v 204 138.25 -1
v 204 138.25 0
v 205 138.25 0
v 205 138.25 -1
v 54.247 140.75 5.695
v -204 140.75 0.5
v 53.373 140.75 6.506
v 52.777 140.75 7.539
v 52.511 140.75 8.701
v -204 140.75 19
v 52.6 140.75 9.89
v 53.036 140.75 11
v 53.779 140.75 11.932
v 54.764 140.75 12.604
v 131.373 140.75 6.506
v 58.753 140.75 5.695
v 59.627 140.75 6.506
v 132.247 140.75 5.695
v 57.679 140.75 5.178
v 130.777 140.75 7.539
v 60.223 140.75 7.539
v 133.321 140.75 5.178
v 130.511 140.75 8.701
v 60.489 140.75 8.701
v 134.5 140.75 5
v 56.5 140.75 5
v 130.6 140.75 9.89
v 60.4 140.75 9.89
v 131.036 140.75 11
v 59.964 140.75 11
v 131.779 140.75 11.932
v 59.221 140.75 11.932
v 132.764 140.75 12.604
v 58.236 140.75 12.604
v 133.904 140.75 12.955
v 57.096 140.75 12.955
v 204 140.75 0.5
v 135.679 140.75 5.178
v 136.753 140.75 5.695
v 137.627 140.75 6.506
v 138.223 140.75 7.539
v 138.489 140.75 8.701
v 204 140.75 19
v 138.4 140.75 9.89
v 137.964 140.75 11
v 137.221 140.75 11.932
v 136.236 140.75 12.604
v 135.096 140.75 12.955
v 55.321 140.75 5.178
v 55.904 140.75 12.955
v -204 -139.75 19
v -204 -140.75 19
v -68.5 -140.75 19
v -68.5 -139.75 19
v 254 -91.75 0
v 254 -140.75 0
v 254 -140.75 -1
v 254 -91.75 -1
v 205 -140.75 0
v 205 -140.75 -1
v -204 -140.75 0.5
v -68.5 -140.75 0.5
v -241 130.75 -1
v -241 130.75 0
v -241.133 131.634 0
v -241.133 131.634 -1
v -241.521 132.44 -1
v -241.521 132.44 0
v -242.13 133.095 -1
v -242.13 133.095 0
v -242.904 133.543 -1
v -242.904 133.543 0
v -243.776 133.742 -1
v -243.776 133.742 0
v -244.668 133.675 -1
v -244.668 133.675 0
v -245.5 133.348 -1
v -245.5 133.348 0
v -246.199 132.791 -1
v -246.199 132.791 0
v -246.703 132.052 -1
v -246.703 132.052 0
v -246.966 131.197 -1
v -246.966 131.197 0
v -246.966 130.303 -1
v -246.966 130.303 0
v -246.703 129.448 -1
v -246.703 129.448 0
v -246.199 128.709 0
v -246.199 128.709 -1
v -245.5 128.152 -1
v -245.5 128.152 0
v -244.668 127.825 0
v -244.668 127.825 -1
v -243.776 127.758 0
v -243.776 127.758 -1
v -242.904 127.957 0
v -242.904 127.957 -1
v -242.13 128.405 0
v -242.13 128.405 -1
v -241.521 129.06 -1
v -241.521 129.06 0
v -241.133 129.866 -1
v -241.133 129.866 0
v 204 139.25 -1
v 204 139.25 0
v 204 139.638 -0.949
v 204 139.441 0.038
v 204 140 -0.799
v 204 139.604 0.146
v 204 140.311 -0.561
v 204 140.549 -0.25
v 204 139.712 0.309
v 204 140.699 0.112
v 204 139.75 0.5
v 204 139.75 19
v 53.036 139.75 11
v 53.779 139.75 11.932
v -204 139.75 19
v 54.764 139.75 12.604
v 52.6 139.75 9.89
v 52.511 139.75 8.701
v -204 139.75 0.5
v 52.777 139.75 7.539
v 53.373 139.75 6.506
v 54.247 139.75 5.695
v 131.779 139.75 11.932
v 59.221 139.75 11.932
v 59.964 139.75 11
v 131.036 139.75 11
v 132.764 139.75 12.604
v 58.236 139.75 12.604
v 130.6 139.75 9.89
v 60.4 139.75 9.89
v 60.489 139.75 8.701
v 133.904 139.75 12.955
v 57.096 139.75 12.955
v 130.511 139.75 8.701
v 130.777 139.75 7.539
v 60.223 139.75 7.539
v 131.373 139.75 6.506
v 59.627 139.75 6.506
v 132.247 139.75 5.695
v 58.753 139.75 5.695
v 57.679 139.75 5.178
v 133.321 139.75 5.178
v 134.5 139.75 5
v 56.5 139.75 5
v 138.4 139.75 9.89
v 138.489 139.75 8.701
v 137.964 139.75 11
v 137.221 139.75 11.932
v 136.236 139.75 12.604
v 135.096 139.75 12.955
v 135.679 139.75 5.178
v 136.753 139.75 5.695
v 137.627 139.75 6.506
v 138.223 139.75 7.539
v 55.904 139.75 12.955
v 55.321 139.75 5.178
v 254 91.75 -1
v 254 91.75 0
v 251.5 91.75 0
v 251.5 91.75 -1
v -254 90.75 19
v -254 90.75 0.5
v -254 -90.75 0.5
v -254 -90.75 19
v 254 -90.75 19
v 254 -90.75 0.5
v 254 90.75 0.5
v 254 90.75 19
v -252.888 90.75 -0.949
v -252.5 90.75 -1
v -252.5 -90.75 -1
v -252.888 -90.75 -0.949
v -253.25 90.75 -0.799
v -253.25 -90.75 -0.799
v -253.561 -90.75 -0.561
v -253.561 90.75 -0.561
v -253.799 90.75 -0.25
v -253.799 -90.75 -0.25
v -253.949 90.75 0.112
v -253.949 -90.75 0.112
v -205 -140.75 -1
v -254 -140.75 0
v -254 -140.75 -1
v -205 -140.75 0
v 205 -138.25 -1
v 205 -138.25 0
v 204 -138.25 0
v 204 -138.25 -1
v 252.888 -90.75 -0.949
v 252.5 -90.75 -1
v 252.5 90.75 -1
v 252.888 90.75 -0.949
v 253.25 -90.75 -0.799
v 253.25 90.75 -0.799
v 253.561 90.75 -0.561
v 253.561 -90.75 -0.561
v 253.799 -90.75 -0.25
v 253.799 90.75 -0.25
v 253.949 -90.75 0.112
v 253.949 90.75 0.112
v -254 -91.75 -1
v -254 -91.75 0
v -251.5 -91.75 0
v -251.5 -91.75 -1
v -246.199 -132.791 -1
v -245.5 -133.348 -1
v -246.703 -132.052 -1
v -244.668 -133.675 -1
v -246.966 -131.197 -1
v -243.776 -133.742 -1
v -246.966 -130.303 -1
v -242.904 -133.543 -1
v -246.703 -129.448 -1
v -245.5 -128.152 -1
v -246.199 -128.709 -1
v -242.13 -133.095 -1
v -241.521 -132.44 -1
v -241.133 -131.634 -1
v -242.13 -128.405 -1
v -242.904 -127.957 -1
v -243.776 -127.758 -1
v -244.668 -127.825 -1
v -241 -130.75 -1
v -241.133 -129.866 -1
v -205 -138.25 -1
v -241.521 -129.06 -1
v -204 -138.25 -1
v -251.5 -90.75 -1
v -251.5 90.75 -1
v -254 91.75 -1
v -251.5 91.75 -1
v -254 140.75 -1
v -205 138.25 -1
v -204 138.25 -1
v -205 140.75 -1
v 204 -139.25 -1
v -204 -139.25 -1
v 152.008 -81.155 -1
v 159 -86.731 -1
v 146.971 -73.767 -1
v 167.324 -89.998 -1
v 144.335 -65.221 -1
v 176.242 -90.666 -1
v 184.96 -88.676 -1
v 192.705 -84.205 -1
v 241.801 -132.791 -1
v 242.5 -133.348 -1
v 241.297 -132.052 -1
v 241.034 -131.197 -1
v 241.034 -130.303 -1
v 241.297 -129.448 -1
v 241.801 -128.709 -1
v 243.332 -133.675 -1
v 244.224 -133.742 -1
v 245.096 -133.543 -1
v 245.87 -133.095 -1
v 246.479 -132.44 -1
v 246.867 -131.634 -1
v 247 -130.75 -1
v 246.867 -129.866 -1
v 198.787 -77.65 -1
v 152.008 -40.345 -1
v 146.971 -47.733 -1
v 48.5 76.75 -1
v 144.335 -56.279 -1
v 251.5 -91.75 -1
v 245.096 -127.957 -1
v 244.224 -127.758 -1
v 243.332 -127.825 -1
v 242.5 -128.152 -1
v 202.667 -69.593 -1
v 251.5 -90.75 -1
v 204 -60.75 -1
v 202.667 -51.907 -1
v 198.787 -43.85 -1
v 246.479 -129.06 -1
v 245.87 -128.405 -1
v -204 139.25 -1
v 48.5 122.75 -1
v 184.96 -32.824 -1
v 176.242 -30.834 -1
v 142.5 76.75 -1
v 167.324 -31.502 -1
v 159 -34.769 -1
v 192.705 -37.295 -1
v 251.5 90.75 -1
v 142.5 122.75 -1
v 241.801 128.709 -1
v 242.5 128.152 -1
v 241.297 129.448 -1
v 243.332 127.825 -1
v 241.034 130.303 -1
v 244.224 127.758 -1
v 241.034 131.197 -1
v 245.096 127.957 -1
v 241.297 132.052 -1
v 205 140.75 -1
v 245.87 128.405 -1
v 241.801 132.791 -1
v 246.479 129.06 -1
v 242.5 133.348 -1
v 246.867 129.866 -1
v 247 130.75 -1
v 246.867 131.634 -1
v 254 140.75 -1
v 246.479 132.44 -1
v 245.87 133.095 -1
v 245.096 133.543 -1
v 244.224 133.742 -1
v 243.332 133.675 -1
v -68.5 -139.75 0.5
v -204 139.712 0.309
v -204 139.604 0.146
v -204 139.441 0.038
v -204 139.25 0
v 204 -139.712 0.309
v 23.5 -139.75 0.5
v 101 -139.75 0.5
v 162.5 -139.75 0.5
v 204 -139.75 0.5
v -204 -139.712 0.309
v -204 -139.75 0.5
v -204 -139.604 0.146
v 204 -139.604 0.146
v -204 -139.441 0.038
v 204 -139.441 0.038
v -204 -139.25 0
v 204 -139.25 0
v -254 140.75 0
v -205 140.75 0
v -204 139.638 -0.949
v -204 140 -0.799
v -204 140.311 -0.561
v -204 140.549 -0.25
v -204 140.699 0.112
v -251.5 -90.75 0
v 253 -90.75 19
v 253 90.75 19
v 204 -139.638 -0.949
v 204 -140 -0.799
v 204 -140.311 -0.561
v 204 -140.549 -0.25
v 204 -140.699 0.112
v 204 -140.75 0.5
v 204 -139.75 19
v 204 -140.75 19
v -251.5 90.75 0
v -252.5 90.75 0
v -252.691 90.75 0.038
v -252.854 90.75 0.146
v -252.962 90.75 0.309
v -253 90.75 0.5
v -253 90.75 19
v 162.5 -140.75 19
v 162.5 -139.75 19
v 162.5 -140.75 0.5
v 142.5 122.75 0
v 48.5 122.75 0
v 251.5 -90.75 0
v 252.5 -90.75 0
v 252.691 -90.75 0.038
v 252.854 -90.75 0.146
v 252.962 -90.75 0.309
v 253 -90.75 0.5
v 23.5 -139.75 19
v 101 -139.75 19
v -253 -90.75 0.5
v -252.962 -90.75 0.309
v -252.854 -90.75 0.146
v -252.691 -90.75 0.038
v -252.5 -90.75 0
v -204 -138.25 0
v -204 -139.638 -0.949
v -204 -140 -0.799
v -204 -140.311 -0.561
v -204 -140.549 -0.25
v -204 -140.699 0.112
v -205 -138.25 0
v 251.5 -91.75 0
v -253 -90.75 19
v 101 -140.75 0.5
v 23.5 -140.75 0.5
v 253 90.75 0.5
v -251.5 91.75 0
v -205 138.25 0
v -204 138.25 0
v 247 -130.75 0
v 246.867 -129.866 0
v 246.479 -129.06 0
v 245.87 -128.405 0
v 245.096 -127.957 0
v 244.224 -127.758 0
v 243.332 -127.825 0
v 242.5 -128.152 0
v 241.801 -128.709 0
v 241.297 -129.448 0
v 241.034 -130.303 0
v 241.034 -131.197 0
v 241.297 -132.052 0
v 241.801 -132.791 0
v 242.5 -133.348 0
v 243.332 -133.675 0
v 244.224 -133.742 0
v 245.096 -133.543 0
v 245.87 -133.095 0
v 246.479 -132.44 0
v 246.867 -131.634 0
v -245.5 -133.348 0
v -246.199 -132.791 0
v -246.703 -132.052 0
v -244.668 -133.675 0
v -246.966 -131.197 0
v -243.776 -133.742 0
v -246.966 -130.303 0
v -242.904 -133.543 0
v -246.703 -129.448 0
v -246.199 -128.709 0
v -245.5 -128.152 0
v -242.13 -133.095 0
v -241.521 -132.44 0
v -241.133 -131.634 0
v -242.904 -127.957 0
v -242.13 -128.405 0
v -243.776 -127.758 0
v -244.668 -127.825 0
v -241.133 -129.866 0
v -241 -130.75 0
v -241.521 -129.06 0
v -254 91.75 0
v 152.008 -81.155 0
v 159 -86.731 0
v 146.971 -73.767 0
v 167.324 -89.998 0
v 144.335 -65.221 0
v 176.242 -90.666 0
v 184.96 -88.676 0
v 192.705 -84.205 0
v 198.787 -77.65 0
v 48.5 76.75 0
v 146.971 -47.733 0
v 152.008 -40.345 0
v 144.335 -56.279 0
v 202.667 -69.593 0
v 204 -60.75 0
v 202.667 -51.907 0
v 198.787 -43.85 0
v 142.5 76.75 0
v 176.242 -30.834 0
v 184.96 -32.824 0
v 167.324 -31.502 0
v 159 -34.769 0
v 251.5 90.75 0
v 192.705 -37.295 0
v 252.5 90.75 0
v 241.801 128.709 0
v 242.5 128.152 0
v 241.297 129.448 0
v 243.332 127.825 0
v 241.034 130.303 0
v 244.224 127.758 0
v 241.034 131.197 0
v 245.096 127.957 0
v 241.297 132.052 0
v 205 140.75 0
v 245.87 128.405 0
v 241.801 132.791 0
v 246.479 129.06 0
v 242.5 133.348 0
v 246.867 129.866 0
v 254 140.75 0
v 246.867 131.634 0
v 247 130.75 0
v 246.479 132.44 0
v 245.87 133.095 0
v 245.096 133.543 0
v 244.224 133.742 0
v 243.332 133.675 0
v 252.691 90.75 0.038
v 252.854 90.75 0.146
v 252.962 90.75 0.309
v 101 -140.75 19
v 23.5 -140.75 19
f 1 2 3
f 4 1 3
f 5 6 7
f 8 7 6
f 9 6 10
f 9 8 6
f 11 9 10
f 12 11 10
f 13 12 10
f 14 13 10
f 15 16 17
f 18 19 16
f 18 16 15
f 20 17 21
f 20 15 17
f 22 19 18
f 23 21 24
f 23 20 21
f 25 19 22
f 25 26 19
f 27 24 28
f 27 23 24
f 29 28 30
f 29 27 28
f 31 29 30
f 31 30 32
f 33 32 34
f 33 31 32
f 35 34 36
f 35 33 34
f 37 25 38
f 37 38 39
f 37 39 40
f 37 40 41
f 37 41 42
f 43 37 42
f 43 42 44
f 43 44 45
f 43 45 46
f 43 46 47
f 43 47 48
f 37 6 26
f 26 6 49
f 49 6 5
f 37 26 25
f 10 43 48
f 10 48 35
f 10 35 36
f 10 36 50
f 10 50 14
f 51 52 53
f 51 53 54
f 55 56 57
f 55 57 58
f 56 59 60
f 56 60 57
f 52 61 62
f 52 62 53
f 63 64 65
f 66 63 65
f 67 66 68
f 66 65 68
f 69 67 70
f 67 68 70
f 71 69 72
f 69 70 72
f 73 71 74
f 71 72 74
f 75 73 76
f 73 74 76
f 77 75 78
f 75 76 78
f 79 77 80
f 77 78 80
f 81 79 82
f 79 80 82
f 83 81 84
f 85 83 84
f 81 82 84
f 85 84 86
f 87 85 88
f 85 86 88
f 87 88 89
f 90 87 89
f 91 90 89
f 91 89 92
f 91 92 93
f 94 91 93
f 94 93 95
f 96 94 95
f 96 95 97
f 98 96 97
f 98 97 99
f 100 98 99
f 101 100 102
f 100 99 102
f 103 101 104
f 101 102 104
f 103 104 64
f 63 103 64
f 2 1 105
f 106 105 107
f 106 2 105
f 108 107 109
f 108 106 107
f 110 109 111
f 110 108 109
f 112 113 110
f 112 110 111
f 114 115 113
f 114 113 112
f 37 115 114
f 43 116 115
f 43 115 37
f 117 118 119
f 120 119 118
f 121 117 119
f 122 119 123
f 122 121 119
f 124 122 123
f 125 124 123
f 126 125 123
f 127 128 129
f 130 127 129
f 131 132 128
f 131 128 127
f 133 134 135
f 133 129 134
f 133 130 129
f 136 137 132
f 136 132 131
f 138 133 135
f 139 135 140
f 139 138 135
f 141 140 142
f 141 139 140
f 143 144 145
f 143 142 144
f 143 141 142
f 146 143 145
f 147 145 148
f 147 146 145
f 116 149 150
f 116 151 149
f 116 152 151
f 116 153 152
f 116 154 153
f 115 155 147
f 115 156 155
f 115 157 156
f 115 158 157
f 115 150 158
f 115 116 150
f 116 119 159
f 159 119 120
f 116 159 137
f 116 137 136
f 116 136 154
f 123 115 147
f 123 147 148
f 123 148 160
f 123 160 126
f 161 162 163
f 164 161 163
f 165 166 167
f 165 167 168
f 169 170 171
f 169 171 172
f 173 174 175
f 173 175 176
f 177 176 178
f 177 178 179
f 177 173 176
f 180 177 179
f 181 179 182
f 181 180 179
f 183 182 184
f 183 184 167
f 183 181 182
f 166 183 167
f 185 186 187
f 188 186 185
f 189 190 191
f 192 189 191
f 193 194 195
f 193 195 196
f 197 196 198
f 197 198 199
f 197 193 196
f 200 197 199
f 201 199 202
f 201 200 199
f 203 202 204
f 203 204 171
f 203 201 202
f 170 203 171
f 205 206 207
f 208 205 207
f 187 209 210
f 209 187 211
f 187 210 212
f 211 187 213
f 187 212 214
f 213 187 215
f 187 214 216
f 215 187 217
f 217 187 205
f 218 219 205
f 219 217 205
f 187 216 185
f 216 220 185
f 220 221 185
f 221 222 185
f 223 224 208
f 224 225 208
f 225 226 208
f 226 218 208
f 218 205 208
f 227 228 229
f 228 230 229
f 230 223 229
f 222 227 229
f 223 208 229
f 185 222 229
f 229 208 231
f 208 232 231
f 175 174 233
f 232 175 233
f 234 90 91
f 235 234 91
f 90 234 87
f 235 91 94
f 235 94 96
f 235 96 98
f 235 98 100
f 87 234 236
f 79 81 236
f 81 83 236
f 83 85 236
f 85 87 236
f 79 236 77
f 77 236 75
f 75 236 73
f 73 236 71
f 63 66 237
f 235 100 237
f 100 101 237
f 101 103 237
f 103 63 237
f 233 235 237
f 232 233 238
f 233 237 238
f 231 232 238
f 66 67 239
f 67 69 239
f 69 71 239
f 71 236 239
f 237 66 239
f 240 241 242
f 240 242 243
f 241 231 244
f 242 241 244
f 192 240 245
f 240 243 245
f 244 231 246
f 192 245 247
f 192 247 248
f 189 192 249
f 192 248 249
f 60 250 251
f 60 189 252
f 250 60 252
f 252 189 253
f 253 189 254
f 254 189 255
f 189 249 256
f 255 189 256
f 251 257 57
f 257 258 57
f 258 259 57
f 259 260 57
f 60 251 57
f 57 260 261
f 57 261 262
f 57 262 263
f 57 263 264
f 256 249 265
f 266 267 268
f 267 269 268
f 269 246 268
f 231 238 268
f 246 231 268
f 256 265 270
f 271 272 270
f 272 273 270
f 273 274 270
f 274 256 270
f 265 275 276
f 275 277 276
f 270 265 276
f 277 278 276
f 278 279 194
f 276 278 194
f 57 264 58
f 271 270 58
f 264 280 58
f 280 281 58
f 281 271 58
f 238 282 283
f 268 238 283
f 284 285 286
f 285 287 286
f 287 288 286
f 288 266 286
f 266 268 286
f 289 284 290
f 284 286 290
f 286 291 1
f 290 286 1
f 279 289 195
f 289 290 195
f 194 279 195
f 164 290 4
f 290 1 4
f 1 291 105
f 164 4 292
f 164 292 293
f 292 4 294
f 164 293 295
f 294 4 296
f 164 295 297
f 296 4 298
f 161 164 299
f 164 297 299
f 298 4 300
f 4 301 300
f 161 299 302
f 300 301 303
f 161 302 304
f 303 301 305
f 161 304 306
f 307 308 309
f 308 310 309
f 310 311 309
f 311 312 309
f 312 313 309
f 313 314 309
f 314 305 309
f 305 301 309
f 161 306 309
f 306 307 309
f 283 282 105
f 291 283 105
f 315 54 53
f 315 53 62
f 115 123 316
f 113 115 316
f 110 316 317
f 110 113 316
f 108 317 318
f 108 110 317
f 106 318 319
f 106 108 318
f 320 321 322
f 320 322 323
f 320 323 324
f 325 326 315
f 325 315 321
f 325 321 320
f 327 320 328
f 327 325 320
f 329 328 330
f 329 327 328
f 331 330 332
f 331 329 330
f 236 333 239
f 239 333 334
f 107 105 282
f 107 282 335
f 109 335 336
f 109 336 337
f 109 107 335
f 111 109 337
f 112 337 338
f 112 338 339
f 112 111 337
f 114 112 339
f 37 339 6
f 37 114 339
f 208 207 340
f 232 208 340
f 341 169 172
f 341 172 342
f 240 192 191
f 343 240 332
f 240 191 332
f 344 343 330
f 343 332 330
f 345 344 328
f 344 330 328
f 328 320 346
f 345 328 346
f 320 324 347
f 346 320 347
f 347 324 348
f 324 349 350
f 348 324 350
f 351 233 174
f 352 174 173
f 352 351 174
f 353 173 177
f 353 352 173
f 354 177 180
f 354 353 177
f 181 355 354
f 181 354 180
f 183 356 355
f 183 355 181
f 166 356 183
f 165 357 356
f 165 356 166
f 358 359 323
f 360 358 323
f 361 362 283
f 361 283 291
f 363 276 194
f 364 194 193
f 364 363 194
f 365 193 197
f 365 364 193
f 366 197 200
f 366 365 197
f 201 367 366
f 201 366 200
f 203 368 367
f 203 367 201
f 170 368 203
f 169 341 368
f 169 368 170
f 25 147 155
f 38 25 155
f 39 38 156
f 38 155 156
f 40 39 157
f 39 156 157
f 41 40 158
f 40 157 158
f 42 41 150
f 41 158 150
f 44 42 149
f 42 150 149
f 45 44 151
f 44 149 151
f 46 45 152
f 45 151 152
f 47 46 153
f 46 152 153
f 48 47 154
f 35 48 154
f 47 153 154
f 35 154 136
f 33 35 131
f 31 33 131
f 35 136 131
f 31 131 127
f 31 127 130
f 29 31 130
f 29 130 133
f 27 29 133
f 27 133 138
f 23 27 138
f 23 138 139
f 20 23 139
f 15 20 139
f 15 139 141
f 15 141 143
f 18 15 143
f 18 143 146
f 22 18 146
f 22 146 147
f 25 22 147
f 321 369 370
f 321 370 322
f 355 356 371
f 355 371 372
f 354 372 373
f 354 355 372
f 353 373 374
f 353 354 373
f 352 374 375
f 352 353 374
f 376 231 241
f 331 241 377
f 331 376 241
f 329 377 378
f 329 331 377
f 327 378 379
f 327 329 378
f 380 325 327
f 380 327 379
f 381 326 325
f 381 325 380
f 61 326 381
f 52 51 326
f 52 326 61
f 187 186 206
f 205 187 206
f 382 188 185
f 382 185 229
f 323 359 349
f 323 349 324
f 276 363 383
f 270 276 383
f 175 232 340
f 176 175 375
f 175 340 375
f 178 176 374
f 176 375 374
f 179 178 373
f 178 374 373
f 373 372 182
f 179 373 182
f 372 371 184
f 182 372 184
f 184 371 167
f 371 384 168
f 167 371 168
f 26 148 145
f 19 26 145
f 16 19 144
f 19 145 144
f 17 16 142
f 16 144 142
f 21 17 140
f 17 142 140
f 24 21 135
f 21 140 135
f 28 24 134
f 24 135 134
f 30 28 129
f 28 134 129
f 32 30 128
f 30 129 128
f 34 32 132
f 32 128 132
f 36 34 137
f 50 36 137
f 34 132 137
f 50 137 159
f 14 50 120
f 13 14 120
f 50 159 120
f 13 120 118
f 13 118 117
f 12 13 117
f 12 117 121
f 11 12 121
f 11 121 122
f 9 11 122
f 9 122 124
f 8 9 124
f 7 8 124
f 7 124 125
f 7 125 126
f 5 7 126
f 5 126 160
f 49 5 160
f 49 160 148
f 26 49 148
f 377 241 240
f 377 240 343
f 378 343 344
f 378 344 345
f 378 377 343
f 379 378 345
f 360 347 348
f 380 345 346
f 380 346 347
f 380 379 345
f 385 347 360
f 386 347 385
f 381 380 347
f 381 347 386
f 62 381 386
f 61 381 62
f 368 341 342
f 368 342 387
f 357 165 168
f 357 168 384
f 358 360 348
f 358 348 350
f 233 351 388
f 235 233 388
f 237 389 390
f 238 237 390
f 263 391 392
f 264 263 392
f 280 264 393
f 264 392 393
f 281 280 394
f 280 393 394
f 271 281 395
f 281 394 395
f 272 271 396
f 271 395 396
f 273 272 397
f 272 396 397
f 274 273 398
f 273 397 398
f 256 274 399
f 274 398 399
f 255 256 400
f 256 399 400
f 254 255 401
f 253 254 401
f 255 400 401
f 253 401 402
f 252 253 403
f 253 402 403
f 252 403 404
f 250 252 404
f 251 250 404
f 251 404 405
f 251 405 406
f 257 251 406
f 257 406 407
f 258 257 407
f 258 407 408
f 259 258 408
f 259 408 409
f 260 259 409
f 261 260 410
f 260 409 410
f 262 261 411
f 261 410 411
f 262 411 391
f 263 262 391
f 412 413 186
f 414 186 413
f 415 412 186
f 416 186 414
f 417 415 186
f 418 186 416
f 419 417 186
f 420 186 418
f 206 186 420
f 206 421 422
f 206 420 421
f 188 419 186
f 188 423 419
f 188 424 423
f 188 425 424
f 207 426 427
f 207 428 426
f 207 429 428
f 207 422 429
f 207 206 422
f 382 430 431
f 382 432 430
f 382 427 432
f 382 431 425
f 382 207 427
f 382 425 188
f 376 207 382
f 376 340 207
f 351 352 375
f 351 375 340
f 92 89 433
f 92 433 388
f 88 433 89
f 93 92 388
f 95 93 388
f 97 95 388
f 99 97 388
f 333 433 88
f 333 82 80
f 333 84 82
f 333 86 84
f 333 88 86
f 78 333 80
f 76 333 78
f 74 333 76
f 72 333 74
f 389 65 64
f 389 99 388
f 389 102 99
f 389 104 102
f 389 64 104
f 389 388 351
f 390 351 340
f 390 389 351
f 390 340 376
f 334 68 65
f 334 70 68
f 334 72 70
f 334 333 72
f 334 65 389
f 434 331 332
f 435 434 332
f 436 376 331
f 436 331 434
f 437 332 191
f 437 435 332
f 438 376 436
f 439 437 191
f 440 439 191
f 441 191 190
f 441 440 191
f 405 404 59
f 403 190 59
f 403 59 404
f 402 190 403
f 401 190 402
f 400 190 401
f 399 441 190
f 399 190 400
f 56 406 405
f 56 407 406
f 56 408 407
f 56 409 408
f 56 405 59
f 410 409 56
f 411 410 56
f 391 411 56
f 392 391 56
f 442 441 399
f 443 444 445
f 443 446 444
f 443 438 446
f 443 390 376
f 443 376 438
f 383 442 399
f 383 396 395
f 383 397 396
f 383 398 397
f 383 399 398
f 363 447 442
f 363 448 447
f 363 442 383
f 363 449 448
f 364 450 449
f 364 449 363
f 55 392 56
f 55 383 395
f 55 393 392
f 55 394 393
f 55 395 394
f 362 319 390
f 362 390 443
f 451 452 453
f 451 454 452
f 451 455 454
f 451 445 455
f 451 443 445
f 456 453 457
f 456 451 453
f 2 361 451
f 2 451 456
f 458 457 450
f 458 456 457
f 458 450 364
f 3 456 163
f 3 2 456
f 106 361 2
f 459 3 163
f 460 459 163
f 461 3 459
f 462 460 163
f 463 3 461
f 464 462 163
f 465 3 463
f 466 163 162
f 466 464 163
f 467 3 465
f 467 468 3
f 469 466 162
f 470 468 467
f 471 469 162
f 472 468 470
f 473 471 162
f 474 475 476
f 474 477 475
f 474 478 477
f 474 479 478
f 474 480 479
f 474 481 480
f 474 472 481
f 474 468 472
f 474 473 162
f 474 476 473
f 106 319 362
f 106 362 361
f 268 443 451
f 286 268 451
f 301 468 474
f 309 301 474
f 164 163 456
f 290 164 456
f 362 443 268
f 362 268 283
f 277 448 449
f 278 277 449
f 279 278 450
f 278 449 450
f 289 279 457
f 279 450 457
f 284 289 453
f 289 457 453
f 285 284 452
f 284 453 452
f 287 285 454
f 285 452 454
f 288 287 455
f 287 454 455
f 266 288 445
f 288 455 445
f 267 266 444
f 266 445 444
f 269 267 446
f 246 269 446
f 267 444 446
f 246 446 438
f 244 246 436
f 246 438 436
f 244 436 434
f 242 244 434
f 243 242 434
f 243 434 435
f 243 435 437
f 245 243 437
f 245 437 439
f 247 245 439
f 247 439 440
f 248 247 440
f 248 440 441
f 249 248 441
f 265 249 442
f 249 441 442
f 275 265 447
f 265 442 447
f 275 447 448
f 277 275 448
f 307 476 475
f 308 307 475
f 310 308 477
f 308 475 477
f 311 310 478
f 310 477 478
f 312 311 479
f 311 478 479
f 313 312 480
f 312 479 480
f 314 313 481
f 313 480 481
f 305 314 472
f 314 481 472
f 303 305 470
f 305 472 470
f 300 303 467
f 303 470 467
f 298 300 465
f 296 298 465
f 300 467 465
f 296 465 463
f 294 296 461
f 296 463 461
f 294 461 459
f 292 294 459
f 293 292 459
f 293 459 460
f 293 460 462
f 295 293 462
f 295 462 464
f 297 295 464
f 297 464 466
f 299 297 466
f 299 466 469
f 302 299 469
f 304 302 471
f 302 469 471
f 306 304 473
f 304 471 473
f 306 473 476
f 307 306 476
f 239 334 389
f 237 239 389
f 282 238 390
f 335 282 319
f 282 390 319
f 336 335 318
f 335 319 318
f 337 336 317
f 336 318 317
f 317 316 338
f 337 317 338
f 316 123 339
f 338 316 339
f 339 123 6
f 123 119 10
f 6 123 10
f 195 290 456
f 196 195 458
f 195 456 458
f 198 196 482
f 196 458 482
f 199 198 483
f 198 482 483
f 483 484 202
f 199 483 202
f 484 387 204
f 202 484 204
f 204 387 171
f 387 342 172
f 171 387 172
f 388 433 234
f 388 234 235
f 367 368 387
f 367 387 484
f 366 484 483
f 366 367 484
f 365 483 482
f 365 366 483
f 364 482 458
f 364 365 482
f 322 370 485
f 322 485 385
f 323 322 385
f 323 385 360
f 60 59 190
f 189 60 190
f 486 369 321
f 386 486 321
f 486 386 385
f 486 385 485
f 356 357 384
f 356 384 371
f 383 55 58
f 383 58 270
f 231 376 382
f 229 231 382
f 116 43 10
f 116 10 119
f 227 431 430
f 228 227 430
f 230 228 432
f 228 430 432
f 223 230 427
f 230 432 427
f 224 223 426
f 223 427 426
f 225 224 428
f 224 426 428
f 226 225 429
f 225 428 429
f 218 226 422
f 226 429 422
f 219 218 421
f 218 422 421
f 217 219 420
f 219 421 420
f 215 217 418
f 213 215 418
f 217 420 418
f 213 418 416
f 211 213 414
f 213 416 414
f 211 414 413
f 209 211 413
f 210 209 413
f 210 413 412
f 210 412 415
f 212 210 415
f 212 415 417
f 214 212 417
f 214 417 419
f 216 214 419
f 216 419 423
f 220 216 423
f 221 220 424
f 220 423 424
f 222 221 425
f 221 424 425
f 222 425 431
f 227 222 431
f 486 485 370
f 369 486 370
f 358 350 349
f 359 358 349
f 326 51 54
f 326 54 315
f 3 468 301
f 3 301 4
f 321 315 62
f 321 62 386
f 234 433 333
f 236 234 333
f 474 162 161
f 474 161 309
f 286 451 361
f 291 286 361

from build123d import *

# Parameters (mm, degrees)
SKETCH_1_W                        = 508
SKETCH_1_H                        = 281.5
SKETCH_1_R                        = 3
SKETCH_1_R_2                      = 30
SKETCH_1_W_2                      = 94
SKETCH_1_H_2                      = 46
SM_BASE_FLANGE_1_DEPTH            = 1
SM_EDGE_FLANGE_1_STRIP_W          = 5
SM_EDGE_FLANGE_1_STRIP_H          = 1
SM_EDGE_FLANGE_1_STRIP_CUT_DEPTH  = 408
SM_EDGE_FLANGE_1_RELIEF_W         = 6
SM_EDGE_FLANGE_1_RELIEF_H         = 1
SM_EDGE_FLANGE_1_RELIEF_CUT_DEPTH = 1
SM_EDGE_FLANGE_1_DEPTH            = 408
SM_EDGE_FLANGE_2_STRIP_W          = 5
SM_EDGE_FLANGE_2_STRIP_H          = 1
SM_EDGE_FLANGE_2_STRIP_CUT_DEPTH  = 408
SM_EDGE_FLANGE_2_RELIEF_W         = 6
SM_EDGE_FLANGE_2_RELIEF_H         = 1
SM_EDGE_FLANGE_2_RELIEF_CUT_DEPTH = 1
SM_EDGE_FLANGE_2_DEPTH            = 408
SM_EDGE_FLANGE_3_STRIP_W          = 5
SM_EDGE_FLANGE_3_STRIP_H          = 1
SM_EDGE_FLANGE_3_STRIP_CUT_DEPTH  = 181.5
SM_EDGE_FLANGE_3_RELIEF_W         = 6
SM_EDGE_FLANGE_3_RELIEF_H         = 1
SM_EDGE_FLANGE_3_RELIEF_CUT_DEPTH = 1
SM_EDGE_FLANGE_3_DEPTH            = 181.5
SM_EDGE_FLANGE_4_STRIP_W          = 5
SM_EDGE_FLANGE_4_STRIP_H          = 1
SM_EDGE_FLANGE_4_STRIP_CUT_DEPTH  = 181.5
SM_EDGE_FLANGE_4_RELIEF_W         = 6
SM_EDGE_FLANGE_4_RELIEF_H         = 1
SM_EDGE_FLANGE_4_RELIEF_CUT_DEPTH = 1
SM_EDGE_FLANGE_4_DEPTH            = 181.5
SKETCH_18_R                       = 4
CUT_EXTRUDE_1_DEPTH               = 379.889495764
SKETCH_19_W                       = 92
SKETCH_19_H                       = 18.5
SKETCH_19_W_2                     = 61.5
CUT_EXTRUDE_2_DEPTH               = 379.889495764


# Sheet-metal steps are written as plain solids
with BuildPart() as part:
    # Sketch 1 → 基体-法兰1 (new body)
    with BuildSketch(Plane.XY):
        Rectangle(SKETCH_1_W, SKETCH_1_H)
        with Locations((-244, 130.75)):
            Circle(SKETCH_1_R, mode=Mode.SUBTRACT)
        with Locations((-244, -130.75)):
            Circle(SKETCH_1_R, mode=Mode.SUBTRACT)
        with Locations((244, 130.75)):
            Circle(SKETCH_1_R, mode=Mode.SUBTRACT)
        with Locations((244, -130.75)):
            Circle(SKETCH_1_R, mode=Mode.SUBTRACT)
        with Locations((174, -60.75)):
            Circle(SKETCH_1_R_2, mode=Mode.SUBTRACT)
        with Locations((95.5, 99.75)):
            Rectangle(SKETCH_1_W_2, SKETCH_1_H_2, mode=Mode.SUBTRACT)
    extrude(amount=-SM_BASE_FLANGE_1_DEPTH)

    # 边线-法兰1 strip (across the edge) → 边线-法兰1 strip cut (cut)
    with BuildSketch(Plane(origin=(204, 140.75, 0), x_dir=(0, -1, 0), z_dir=(-1, 0, 0))):
        with Locations((-1, -0.5)):
            Rectangle(SM_EDGE_FLANGE_1_STRIP_W, SM_EDGE_FLANGE_1_STRIP_H)
    extrude(amount=SM_EDGE_FLANGE_1_STRIP_CUT_DEPTH, mode=Mode.SUBTRACT)

    # 边线-法兰1 relief (on the sheet) → 边线-法兰1 relief cut (cut)
    with BuildSketch(Plane(origin=(204, 139.25, 0), x_dir=(0, -1, 0), z_dir=(0, 0, 1))):
        with Locations((-2, 0.5)):
            Rectangle(SM_EDGE_FLANGE_1_RELIEF_W, SM_EDGE_FLANGE_1_RELIEF_H)
        with Locations((-2, -408.5)):
            Rectangle(SM_EDGE_FLANGE_1_RELIEF_W, SM_EDGE_FLANGE_1_RELIEF_H)
    extrude(amount=-SM_EDGE_FLANGE_1_RELIEF_CUT_DEPTH, mode=Mode.SUBTRACT)

    # 边线-法兰1 section (across the edge) → 边线-法兰1 (add)
    with BuildSketch(Plane(origin=(204, 140.75, 0), x_dir=(0, -1, 0), z_dir=(-1, 0, 0))):
        with BuildLine():
            Line((0, 0.5), (0, 19))
            Line((0, 19), (1, 19))
            Line((1, 19), (1, 0.5))
            ThreePointArc((1, 0.5), (1.146446609, 0.146446609), (1.5, 0))
            Line((1.5, 0), (1.5, -1))
            ThreePointArc((1.5, -1), (0.439339828, -0.560660172), (0, 0.5))
        make_face()
    extrude(amount=SM_EDGE_FLANGE_1_DEPTH)

    # 边线-法兰2 strip (across the edge) → 边线-法兰2 strip cut (cut)
    with BuildSketch(Plane(origin=(-204, -140.75, 0), x_dir=(0, 1, 0), z_dir=(1, 0, 0))):
        with Locations((-1, -0.5)):
            Rectangle(SM_EDGE_FLANGE_2_STRIP_W, SM_EDGE_FLANGE_2_STRIP_H)
    extrude(amount=SM_EDGE_FLANGE_2_STRIP_CUT_DEPTH, mode=Mode.SUBTRACT)

    # 边线-法兰2 relief (on the sheet) → 边线-法兰2 relief cut (cut)
    with BuildSketch(Plane(origin=(-204, -139.25, 0), x_dir=(0, 1, 0), z_dir=(0, 0, 1))):
        with Locations((-2, 0.5)):
            Rectangle(SM_EDGE_FLANGE_2_RELIEF_W, SM_EDGE_FLANGE_2_RELIEF_H)
        with Locations((-2, -408.5)):
            Rectangle(SM_EDGE_FLANGE_2_RELIEF_W, SM_EDGE_FLANGE_2_RELIEF_H)
    extrude(amount=-SM_EDGE_FLANGE_2_RELIEF_CUT_DEPTH, mode=Mode.SUBTRACT)

    # 边线-法兰2 section (across the edge) → 边线-法兰2 (add)
    with BuildSketch(Plane(origin=(-204, -140.75, 0), x_dir=(0, 1, 0), z_dir=(1, 0, 0))):
        with BuildLine():
            Line((0, 0.5), (0, 19))
            Line((0, 19), (1, 19))
            Line((1, 19), (1, 0.5))
            ThreePointArc((1, 0.5), (1.146446609, 0.146446609), (1.5, 0))
            Line((1.5, 0), (1.5, -1))
            ThreePointArc((1.5, -1), (0.439339828, -0.560660172), (0, 0.5))
        make_face()
    extrude(amount=SM_EDGE_FLANGE_2_DEPTH)

    # 边线-法兰3 strip (across the edge) → 边线-法兰3 strip cut (cut)
    with BuildSketch(Plane(origin=(254, -90.75, 0), x_dir=(-1, 0, 0), z_dir=(0, 1, 0))):
        with Locations((-1, -0.5)):
            Rectangle(SM_EDGE_FLANGE_3_STRIP_W, SM_EDGE_FLANGE_3_STRIP_H)
    extrude(amount=SM_EDGE_FLANGE_3_STRIP_CUT_DEPTH, mode=Mode.SUBTRACT)

    # 边线-法兰3 relief (on the sheet) → 边线-法兰3 relief cut (cut)
    with BuildSketch(Plane(origin=(252.5, -90.75, 0), x_dir=(-1, 0, 0), z_dir=(0, 0, 1))):
        with Locations((-2, 0.5)):
            Rectangle(SM_EDGE_FLANGE_3_RELIEF_W, SM_EDGE_FLANGE_3_RELIEF_H)
        with Locations((-2, -182)):
            Rectangle(SM_EDGE_FLANGE_3_RELIEF_W, SM_EDGE_FLANGE_3_RELIEF_H)
    extrude(amount=-SM_EDGE_FLANGE_3_RELIEF_CUT_DEPTH, mode=Mode.SUBTRACT)

    # 边线-法兰3 section (across the edge) → 边线-法兰3 (add)
    with BuildSketch(Plane(origin=(254, -90.75, 0), x_dir=(-1, 0, 0), z_dir=(0, 1, 0))):
        with BuildLine():
            Line((0, 0.5), (0, 19))
            Line((0, 19), (1, 19))
            Line((1, 19), (1, 0.5))
            ThreePointArc((1, 0.5), (1.146446609, 0.146446609), (1.5, 0))
            Line((1.5, 0), (1.5, -1))
            ThreePointArc((1.5, -1), (0.439339828, -0.560660172), (0, 0.5))
        make_face()
    extrude(amount=SM_EDGE_FLANGE_3_DEPTH)

    # 边线-法兰4 strip (across the edge) → 边线-法兰4 strip cut (cut)
    with BuildSketch(Plane(origin=(-254, 90.75, 0), x_dir=(1, 0, 0), z_dir=(0, -1, 0))):
        with Locations((-1, -0.5)):
            Rectangle(SM_EDGE_FLANGE_4_STRIP_W, SM_EDGE_FLANGE_4_STRIP_H)
    extrude(amount=SM_EDGE_FLANGE_4_STRIP_CUT_DEPTH, mode=Mode.SUBTRACT)

    # 边线-法兰4 relief (on the sheet) → 边线-法兰4 relief cut (cut)
    with BuildSketch(Plane(origin=(-252.5, 90.75, 0), x_dir=(1, 0, 0), z_dir=(0, 0, 1))):
        with Locations((-2, 0.5)):
            Rectangle(SM_EDGE_FLANGE_4_RELIEF_W, SM_EDGE_FLANGE_4_RELIEF_H)
        with Locations((-2, -182)):
            Rectangle(SM_EDGE_FLANGE_4_RELIEF_W, SM_EDGE_FLANGE_4_RELIEF_H)
    extrude(amount=-SM_EDGE_FLANGE_4_RELIEF_CUT_DEPTH, mode=Mode.SUBTRACT)

    # 边线-法兰4 section (across the edge) → 边线-法兰4 (add)
    with BuildSketch(Plane(origin=(-254, 90.75, 0), x_dir=(1, 0, 0), z_dir=(0, -1, 0))):
        with BuildLine():
            Line((0, 0.5), (0, 19))
            Line((0, 19), (1, 19))
            Line((1, 19), (1, 0.5))
            ThreePointArc((1, 0.5), (1.146446609, 0.146446609), (1.5, 0))
            Line((1.5, 0), (1.5, -1))
            ThreePointArc((1.5, -1), (0.439339828, -0.560660172), (0, 0.5))
        make_face()
    extrude(amount=SM_EDGE_FLANGE_4_DEPTH)

    # 草图18 → 切除-拉伸1 (cut, through all)
    with BuildSketch(Plane(origin=(0, 139.75, 0), x_dir=(-1, 0, 0), z_dir=(0, -1, 0))):
        with Locations(Location((-134.5, -9, 0), (0, 0, 90))):
            Circle(SKETCH_18_R)
        with Locations(Location((-56.5, -9, 0), (0, 0, 90))):
            Circle(SKETCH_18_R)
    extrude(amount=-CUT_EXTRUDE_1_DEPTH, mode=Mode.SUBTRACT)

    # 草图19 → 切除-拉伸2 (cut, through all)
    with BuildSketch(Plane(origin=(0, -139.75, 0), x_dir=(1, 0, 0), z_dir=(0, 1, 0))):
        with Locations((-22.5, -9.75)):
            Rectangle(SKETCH_19_W, SKETCH_19_H)
        with Locations((131.75, -9.75)):
            Rectangle(SKETCH_19_W_2, SKETCH_19_H)
    extrude(amount=-CUT_EXTRUDE_2_DEPTH, mode=Mode.SUBTRACT)


solid = part.part
